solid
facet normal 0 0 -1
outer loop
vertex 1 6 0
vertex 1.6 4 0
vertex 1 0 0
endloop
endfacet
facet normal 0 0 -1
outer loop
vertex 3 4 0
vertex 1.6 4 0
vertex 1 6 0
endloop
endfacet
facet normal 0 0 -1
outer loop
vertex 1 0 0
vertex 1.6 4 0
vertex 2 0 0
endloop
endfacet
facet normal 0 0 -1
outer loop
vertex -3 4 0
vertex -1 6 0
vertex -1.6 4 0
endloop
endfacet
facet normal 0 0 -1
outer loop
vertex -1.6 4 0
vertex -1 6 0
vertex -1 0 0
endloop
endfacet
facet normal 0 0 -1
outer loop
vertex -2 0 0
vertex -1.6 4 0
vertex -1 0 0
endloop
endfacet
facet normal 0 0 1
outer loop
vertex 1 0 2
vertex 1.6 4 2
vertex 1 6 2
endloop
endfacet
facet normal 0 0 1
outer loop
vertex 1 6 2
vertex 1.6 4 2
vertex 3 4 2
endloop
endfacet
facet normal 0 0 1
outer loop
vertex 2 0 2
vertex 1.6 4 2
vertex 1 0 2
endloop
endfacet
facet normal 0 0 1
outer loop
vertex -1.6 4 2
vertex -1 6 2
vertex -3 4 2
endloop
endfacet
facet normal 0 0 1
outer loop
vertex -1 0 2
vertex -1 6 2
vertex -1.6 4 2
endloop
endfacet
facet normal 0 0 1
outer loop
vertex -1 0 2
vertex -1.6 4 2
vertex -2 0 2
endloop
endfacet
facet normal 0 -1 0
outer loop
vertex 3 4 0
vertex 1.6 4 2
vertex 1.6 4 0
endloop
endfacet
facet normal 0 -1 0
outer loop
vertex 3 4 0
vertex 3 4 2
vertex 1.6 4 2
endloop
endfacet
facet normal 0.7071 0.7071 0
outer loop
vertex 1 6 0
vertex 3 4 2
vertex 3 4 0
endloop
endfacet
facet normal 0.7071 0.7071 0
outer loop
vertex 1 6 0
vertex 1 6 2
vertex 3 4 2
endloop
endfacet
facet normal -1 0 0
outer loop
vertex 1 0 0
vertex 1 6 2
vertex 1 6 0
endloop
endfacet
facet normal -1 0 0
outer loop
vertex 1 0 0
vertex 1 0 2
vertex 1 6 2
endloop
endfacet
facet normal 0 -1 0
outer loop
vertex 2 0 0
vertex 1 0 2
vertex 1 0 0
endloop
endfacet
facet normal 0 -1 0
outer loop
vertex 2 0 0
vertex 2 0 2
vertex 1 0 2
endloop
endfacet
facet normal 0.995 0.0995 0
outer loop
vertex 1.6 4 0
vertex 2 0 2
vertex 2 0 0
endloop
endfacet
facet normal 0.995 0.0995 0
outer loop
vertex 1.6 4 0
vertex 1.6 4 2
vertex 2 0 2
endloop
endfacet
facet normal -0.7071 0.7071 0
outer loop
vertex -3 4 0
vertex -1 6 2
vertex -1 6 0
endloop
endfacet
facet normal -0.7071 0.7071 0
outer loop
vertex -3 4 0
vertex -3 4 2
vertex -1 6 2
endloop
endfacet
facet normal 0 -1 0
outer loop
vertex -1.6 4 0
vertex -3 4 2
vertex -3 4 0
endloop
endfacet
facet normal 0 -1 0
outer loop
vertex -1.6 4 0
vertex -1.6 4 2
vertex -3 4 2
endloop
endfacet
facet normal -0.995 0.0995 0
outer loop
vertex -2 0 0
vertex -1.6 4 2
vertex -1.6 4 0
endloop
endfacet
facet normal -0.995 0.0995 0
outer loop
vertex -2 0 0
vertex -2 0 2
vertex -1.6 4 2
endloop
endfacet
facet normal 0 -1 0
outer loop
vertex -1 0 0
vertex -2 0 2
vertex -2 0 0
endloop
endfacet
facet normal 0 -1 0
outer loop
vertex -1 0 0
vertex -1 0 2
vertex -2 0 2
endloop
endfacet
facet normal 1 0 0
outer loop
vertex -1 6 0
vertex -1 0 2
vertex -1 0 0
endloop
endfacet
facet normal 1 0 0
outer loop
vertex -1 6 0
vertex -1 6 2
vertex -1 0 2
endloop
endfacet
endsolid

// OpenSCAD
taperratio = .8; //the reduced base thickness

function cantileverPoly(x0, x1, y0, y1, tap, mask = 0) = [ 
  (mask >  0)?[0,0]:[x1-x0,0],
  (mask >  0)?[x0+mask,0]:[x0,0],
  (mask >  0)?[x0+2*mask,y0-2*mask]:[x0*tap,y0],
  (mask >  0)?[x1+mask,y0-2*mask]:[x1,y0],
  (mask >  0)?[x1+mask,y0+mask]:[x1,y0],
  (mask >  0)?[0,y1+y0+2*mask]:[x1-x0,y1+y0]
];


doubleCantilever(baseThick = 2, headThick = 3, cantL = 4, headL = 2, ratio = taperratio, mask = 0.0);
module doubleCantilever(baseThick = 2, headThick = 3, cantL = 4, headL = 2, ratio = taperratio, mask = 0, d = 2)
{
linear_extrude(height = d)
{
polygon(cantileverPoly(baseThick,headThick,cantL,headL,taperratio,mask));
mirror([1,0,0]) polygon(cantileverPoly(baseThick,headThick,cantL,headL,taperratio,mask));
}

}// module doubleCantilever(baseThick = 2, headThick = 3, cantL = 4, headL = 2, ratio = taperratio, mask = 0)
